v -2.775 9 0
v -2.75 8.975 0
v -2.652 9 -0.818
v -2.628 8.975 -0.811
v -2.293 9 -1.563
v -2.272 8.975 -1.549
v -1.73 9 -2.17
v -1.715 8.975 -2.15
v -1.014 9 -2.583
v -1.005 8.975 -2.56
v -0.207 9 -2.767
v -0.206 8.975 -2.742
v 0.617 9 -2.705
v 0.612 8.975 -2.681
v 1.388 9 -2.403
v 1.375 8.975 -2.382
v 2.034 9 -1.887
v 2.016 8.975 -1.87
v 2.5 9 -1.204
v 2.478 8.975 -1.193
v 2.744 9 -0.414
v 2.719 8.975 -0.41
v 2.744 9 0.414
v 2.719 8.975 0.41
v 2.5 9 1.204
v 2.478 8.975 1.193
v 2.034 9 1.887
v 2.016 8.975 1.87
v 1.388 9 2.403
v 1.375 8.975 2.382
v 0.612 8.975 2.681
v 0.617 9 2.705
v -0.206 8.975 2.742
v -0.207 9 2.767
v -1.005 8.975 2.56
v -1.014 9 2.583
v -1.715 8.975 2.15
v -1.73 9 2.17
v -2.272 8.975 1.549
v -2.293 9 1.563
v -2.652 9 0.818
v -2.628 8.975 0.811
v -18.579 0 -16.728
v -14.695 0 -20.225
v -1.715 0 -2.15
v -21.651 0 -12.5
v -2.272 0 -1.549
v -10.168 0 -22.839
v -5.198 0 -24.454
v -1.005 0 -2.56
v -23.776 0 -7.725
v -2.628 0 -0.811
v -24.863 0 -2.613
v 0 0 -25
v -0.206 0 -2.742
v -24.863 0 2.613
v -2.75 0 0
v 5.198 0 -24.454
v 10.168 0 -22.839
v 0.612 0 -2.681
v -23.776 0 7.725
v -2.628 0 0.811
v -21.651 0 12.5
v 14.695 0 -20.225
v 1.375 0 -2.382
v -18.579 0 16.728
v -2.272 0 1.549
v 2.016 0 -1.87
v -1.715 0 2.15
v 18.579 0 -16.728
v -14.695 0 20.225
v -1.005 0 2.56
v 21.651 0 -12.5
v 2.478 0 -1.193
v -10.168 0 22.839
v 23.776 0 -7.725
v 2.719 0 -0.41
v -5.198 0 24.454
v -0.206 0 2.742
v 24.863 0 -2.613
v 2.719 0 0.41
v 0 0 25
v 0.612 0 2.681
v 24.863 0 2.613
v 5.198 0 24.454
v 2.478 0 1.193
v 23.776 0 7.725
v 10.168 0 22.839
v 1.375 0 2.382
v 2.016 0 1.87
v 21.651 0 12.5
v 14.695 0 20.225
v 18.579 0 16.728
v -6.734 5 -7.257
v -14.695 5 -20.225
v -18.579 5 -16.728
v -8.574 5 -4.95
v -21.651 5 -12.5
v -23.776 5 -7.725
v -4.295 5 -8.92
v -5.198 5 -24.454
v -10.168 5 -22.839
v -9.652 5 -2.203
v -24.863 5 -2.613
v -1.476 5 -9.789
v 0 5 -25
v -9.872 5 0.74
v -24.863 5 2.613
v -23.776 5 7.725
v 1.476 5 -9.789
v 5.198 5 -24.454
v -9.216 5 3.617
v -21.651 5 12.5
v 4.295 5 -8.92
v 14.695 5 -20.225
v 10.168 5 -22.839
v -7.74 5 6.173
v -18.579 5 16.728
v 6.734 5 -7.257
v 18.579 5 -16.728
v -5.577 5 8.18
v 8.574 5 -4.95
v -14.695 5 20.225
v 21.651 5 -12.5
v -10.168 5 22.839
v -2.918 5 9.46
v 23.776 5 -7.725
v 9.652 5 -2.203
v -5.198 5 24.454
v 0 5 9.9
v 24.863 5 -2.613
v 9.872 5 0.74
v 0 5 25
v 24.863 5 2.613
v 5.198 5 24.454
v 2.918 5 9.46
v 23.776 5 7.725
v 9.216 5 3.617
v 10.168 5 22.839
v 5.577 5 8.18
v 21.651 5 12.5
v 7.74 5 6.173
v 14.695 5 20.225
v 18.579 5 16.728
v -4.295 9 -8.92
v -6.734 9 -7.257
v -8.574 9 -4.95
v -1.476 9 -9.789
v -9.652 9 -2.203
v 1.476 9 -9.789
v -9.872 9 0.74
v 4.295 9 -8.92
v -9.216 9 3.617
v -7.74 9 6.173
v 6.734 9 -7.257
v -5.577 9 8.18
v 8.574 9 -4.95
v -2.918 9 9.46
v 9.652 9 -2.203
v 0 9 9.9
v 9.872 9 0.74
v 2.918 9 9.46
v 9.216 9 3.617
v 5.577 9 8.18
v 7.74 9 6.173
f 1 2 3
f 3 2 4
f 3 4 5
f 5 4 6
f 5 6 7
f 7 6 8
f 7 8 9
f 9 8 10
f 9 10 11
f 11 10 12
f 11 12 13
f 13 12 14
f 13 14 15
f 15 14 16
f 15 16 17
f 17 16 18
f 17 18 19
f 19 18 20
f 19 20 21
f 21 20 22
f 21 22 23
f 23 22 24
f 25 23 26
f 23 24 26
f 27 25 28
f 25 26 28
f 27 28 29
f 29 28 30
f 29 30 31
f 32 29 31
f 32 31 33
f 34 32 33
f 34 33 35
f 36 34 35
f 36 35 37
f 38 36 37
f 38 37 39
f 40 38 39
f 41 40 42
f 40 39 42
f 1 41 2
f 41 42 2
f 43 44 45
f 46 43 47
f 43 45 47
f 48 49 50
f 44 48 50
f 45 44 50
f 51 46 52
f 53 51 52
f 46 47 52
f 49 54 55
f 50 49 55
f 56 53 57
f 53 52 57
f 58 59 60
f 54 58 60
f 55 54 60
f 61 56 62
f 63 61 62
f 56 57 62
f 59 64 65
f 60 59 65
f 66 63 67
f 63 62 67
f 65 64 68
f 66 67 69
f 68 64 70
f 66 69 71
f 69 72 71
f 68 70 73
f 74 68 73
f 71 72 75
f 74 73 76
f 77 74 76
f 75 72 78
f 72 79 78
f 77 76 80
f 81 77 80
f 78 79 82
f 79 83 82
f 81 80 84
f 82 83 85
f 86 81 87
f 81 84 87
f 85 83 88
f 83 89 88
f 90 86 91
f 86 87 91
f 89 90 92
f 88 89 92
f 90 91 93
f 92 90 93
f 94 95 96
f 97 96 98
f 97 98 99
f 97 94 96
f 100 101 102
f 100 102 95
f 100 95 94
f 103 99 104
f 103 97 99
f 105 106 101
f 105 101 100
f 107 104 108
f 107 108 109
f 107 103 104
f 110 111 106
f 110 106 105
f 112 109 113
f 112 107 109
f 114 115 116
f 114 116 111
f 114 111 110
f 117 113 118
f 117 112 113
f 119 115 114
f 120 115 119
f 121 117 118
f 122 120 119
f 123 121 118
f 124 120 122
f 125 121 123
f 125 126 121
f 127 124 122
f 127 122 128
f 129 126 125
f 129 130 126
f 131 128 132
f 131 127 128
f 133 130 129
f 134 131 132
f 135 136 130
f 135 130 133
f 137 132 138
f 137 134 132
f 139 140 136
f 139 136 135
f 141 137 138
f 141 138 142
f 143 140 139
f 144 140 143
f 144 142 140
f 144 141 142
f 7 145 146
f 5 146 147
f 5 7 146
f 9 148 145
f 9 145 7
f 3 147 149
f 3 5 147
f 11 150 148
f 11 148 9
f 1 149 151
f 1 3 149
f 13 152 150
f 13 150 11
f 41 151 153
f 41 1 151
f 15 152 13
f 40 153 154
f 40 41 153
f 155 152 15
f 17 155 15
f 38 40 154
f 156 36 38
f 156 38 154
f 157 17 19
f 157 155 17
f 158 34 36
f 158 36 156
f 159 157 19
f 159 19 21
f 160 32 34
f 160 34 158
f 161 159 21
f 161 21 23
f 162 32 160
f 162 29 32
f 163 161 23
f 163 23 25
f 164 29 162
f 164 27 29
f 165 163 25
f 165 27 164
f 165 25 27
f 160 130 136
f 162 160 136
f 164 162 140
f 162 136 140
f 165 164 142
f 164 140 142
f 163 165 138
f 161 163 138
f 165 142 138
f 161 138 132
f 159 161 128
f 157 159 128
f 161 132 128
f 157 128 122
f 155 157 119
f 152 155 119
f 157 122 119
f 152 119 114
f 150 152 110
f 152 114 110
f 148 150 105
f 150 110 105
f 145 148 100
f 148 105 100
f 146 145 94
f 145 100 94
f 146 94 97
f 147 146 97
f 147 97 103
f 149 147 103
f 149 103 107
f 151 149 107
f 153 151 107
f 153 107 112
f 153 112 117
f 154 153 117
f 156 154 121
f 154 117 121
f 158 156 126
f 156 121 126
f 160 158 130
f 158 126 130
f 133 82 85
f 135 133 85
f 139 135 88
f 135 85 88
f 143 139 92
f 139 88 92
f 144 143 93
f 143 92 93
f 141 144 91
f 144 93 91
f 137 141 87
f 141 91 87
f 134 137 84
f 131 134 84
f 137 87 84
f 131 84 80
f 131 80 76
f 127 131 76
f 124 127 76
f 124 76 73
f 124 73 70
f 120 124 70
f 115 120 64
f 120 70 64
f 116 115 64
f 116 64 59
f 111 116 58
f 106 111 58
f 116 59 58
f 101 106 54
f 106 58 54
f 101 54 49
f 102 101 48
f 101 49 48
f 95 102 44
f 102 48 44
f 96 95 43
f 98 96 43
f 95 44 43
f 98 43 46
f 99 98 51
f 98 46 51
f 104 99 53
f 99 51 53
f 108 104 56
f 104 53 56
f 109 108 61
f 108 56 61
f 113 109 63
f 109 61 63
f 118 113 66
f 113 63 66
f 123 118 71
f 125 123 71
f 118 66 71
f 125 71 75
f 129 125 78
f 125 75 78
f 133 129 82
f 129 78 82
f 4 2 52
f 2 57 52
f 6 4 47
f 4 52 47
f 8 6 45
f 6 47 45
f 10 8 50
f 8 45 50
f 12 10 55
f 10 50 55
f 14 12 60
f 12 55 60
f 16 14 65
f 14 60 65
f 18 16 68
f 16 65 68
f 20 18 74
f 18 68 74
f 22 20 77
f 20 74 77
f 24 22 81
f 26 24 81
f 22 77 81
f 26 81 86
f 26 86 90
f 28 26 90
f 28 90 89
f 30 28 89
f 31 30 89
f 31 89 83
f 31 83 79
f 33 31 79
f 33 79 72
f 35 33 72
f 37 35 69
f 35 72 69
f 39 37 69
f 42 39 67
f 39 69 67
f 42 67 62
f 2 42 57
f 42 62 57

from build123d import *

# Parameters (mm, degrees)
SKETCH1_R                      = 25
BOSS_EXTRUDE1_DEPTH            = 5
SKETCH2_R                      = 9.9
BOSS_EXTRUDE2_DEPTH            = 4
M5_CLEARANCE_HOLE1_D           = 5.5
M5_CLEARANCE_HOLE1_CSINK_D     = 5.55
M5_CLEARANCE_HOLE1_CSINK_ANGLE = 90


with BuildPart() as part:
    # Sketch1 → Boss-Extrude1 (new body)
    with BuildSketch(Plane(origin=(0, 0, 0), x_dir=(1, 0, 0), z_dir=(0, 1, 0))):
        with Locations(Location((0, 0, 0), (0, 0, 270))):
            Circle(SKETCH1_R)
    extrude(amount=BOSS_EXTRUDE1_DEPTH)

    # Sketch2 → Boss-Extrude2 (add)
    with BuildSketch(Plane(origin=(0, 5, 0), x_dir=(1, 0, 0), z_dir=(0, 1, 0))):
        with Locations(Location((0, 0, 0), (0, 0, 270))):
            Circle(SKETCH2_R)
    extrude(amount=BOSS_EXTRUDE2_DEPTH)

    # M5 Clearance Hole1 (through all)
    with Locations(Plane(origin=(0, 9, 0), x_dir=(1, 0, 0), z_dir=(0, 1, 0))):
        with Locations((0, 0)):
            CounterSinkHole(M5_CLEARANCE_HOLE1_D / 2, M5_CLEARANCE_HOLE1_CSINK_D / 2, counter_sink_angle=M5_CLEARANCE_HOLE1_CSINK_ANGLE)


solid = part.part
